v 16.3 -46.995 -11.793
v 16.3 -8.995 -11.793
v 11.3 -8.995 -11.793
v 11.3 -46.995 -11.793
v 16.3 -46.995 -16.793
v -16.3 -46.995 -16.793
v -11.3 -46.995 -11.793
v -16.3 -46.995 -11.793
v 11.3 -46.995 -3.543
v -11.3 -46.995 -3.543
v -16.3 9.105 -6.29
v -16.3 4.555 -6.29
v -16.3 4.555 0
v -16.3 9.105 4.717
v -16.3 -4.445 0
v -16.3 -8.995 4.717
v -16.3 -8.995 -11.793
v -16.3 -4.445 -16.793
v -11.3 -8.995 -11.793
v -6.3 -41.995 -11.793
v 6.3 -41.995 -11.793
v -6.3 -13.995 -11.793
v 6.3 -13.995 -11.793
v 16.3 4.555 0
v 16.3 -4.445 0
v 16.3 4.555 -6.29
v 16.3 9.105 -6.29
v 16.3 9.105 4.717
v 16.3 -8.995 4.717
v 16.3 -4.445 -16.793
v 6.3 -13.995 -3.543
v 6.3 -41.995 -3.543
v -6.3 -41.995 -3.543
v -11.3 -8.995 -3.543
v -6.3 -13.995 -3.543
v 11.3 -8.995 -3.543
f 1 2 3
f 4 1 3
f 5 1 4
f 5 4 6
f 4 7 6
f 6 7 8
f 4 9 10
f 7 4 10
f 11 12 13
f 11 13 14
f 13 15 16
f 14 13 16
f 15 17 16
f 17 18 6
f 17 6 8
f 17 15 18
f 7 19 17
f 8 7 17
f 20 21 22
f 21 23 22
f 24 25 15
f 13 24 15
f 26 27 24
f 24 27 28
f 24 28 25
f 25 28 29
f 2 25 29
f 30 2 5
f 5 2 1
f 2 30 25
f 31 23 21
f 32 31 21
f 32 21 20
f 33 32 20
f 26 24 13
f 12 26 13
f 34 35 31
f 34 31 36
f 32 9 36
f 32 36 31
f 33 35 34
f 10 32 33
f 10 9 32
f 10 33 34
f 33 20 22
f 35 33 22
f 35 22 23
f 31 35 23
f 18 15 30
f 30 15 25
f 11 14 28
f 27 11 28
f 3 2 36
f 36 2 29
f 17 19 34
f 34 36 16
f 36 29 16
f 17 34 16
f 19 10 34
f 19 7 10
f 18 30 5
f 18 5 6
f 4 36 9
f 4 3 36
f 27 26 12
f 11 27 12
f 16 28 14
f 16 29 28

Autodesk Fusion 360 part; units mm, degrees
sketch "Sketch1" plane through (0, 0, 0) normal (0, 0, 1) x (1, 0, 0)
  line L0 (-41.91, -4.445) -> (41.91, -4.445)
  line L1 (41.91, -4.445) -> (41.91, 4.445)
  line L2 (41.91, 4.445) -> (-41.91, 4.445)
  line L3 (-41.91, 4.445) -> (-41.91, -4.445)
  line L4 (-41.91, 4.445) -> (41.91, -4.445) construction
  line L5 (41.91, 4.445) -> (-41.91, -4.445) construction
  dimension "d1" = 83.82
  dimension "d2" = 8.89
extrude "Extrude1" add sketch "Sketch1" along normal blind 4.7171 makes body 1
sketch "Sketch2" plane through (0, 0, 4.7171) normal (0, 0, 1) x (-1, 0, 0)
  line L0 (41.91, -4.445) -> (41.91, 4.445)
  line L1 (41.91, 4.445) -> (-41.91, 4.445)
  line L2 (-41.91, 4.445) -> (-41.91, -4.445)
  line L3 (-41.91, -4.445) -> (41.91, -4.445)
  line L4 (-41.91, -4.445) -> (41.91, -4.445)
  line L5 (41.91, -4.445) -> (41.91, -9.105)
  line L6 (41.91, -9.105) -> (-41.91, -9.105)
  line L7 (-41.91, -9.105) -> (-41.91, -4.445)
  line L8 (-41.91, -4.555) -> (41.91, -4.555)
  dimension "d5" = 4.66
  dimension "d34" = 0.11
extrude "Extrude2" add sketch "Sketch2" against normal blind 11.0067 separate body contours L5 L6 L7 L8 makes body 2
sketch "Sketch3" plane through (0, 0, 4.7171) normal (0, 0, 1) x (-1, 0, 0)
  line L0 (41.91, -4.445) -> (41.91, 4.445)
  line L1 (41.91, 4.445) -> (-41.91, 4.445)
  line L2 (-41.91, 4.445) -> (-41.91, -4.445)
  line L3 (-41.91, -9.105) -> (41.91, -9.105)
  line L4 (41.91, 4.445) -> (-41.91, 4.445)
  line L5 (-41.91, 4.445) -> (-41.91, 8.995)
  line L6 (-41.91, 8.995) -> (41.91, 8.995)
  line L7 (41.91, 8.995) -> (41.91, 4.445)
  line L8 (-41.91, -4.445) -> (41.91, -4.445)
  line L9 (-41.91, -4.555) -> (-41.91, -9.105)
  line L10 (41.91, -9.105) -> (41.91, -4.555)
  line L11 (41.91, -4.555) -> (-41.91, -4.555)
  dimension "d8" = 4.55
extrude "Extrude3" add sketch "Sketch3" against normal blind 16.51 contours L1 L4 L5 L6 L7 bodies 1
ref_plane "WorkPlane1" through (0, -2.275, -11.7929) normal (0, 0, 1) x (1, 0, 0)
sketch "Sketch4" plane through (0, 0, -11.7929) normal (0, 0, 1) x (1, 0, 0)
  line L0 (41.91, -8.995) -> (-41.91, -8.995)
  line L1 (-41.91, -8.995) -> (41.91, -8.995)
  line L2 (41.91, -8.995) -> (41.91, -38.995)
  line L3 (41.91, -38.995) -> (-41.91, -38.995)
  line L4 (-41.91, -38.995) -> (-41.91, -8.995)
  dimension "d12" = 30
extrude "Extrude4" add sketch "Sketch4" against normal blind 5 separate body makes body 3
sketch "Sketch5" plane through (0, 0, -11.7929) normal (0, 0, -1) x (1, 0, 0)
  line L0 (41.91, 8.995) -> (-41.91, 8.995)
  line L1 (-41.91, 8.995) -> (-41.91, 4.445)
  line L2 (-41.91, 4.445) -> (41.91, 4.445)
  line L3 (41.91, 4.445) -> (41.91, 8.995)
extrude "Extrude5" add sketch "Sketch5" along normal blind 5 bodies 1 3
extrude "Extrude6" add 1 faces at (13.97, -38.995, -13.4595) along direction (0, -1, 0) blind 8 on bodies 1 bodies 1
sketch "Sketch6" plane through (0, 0, -11.7929) normal (0, 0, 1) x (-1, 0, 0)
  line L0 (-41.91, 46.995) -> (-41.91, 8.995)
  line L1 (-41.91, 8.995) -> (41.91, 8.995)
  line L2 (41.91, 8.995) -> (41.91, 46.995)
  line L3 (6.3, 13.995) -> (-6.3, 13.995)
  line L4 (-6.3, 13.995) -> (-6.3, 41.995)
  line L5 (-6.3, 41.995) -> (6.3, 41.995)
  line L6 (6.3, 41.995) -> (6.3, 13.995)
  line L7 (6.3, 13.995) -> (-6.3, 41.995) construction
  line L8 (-6.3, 13.995) -> (6.3, 41.995) construction
  line L9 (-41.91, 8.995) -> (41.91, 8.995)
  line L10 (41.91, 46.995) -> (-41.91, 46.995)
  line L11 (11.3, 8.995) -> (-11.3, 8.995)
  line L12 (-11.3, 8.995) -> (-11.3, 46.995)
  line L13 (-11.3, 46.995) -> (11.3, 46.995)
  line L14 (11.3, 46.995) -> (11.3, 8.995)
  line L15 (0, 8.995) -> (0, 46.995) construction
  line L16 (16.3, 8.995) -> (-16.3, 8.995)
  line L17 (-16.3, 8.995) -> (-16.3, 46.995)
  line L18 (-16.3, 46.995) -> (16.3, 46.995)
  line L19 (16.3, 46.995) -> (16.3, 8.995)
  dimension "d17" = 12.6
  dimension "d18" = 28
  dimension "d22" = 5
  dimension "d23" = 5
  dimension "d24" = 5
  dimension "d25" = 5
  dimension "d26" = 5
  dimension "d27" = 25.61
extrude "Extrude7" cut 1 faces at (-41.91, -20.145, -15.1262) along direction (1, 0, 0) blind 25.61 on bodies 1 bodies 1
extrude "Extrude8" cut 1 faces at (41.91, -20.145, -15.1262) along direction (-1, 0, 0) blind 25.61 on bodies 1 bodies 1
extrude "Extrude9" add sketch "Sketch6" along normal blind 8.25 contours L1 L9 L10 L11 L12 L13 L14 L16 L18 bodies 1
extrude "Extrude10" add 1 faces at (5.4333, 4.445, 1.5724) along direction (0, 1, 0) blind 0.11 on bodies 1 bodies 1 2
extrude "Extrude11" cut 1 faces at (41.91, 7.5883, 1.0483) along direction (-1, 0, 0) blind 25.61 on bodies 1 bodies 1
extrude "Extrude12" cut 1 faces at (-41.91, 6.0717, 1.0483) along direction (1, 0, 0) blind 25.61 on bodies 1 bodies 1
equation "d3 = ( 33.02 / 7 ) * 1 mm"
equation "d6 = ( ( -2 * 33.02 ) / 6 ) * 1 mm"
equation "d9 = ( -33.02 / 2 ) * 1 mm"
equation "d11 = ( -33.02 / 2 ) * 1 mm"
equation "d32 = ( 33 / 4 ) * 1 mm"
